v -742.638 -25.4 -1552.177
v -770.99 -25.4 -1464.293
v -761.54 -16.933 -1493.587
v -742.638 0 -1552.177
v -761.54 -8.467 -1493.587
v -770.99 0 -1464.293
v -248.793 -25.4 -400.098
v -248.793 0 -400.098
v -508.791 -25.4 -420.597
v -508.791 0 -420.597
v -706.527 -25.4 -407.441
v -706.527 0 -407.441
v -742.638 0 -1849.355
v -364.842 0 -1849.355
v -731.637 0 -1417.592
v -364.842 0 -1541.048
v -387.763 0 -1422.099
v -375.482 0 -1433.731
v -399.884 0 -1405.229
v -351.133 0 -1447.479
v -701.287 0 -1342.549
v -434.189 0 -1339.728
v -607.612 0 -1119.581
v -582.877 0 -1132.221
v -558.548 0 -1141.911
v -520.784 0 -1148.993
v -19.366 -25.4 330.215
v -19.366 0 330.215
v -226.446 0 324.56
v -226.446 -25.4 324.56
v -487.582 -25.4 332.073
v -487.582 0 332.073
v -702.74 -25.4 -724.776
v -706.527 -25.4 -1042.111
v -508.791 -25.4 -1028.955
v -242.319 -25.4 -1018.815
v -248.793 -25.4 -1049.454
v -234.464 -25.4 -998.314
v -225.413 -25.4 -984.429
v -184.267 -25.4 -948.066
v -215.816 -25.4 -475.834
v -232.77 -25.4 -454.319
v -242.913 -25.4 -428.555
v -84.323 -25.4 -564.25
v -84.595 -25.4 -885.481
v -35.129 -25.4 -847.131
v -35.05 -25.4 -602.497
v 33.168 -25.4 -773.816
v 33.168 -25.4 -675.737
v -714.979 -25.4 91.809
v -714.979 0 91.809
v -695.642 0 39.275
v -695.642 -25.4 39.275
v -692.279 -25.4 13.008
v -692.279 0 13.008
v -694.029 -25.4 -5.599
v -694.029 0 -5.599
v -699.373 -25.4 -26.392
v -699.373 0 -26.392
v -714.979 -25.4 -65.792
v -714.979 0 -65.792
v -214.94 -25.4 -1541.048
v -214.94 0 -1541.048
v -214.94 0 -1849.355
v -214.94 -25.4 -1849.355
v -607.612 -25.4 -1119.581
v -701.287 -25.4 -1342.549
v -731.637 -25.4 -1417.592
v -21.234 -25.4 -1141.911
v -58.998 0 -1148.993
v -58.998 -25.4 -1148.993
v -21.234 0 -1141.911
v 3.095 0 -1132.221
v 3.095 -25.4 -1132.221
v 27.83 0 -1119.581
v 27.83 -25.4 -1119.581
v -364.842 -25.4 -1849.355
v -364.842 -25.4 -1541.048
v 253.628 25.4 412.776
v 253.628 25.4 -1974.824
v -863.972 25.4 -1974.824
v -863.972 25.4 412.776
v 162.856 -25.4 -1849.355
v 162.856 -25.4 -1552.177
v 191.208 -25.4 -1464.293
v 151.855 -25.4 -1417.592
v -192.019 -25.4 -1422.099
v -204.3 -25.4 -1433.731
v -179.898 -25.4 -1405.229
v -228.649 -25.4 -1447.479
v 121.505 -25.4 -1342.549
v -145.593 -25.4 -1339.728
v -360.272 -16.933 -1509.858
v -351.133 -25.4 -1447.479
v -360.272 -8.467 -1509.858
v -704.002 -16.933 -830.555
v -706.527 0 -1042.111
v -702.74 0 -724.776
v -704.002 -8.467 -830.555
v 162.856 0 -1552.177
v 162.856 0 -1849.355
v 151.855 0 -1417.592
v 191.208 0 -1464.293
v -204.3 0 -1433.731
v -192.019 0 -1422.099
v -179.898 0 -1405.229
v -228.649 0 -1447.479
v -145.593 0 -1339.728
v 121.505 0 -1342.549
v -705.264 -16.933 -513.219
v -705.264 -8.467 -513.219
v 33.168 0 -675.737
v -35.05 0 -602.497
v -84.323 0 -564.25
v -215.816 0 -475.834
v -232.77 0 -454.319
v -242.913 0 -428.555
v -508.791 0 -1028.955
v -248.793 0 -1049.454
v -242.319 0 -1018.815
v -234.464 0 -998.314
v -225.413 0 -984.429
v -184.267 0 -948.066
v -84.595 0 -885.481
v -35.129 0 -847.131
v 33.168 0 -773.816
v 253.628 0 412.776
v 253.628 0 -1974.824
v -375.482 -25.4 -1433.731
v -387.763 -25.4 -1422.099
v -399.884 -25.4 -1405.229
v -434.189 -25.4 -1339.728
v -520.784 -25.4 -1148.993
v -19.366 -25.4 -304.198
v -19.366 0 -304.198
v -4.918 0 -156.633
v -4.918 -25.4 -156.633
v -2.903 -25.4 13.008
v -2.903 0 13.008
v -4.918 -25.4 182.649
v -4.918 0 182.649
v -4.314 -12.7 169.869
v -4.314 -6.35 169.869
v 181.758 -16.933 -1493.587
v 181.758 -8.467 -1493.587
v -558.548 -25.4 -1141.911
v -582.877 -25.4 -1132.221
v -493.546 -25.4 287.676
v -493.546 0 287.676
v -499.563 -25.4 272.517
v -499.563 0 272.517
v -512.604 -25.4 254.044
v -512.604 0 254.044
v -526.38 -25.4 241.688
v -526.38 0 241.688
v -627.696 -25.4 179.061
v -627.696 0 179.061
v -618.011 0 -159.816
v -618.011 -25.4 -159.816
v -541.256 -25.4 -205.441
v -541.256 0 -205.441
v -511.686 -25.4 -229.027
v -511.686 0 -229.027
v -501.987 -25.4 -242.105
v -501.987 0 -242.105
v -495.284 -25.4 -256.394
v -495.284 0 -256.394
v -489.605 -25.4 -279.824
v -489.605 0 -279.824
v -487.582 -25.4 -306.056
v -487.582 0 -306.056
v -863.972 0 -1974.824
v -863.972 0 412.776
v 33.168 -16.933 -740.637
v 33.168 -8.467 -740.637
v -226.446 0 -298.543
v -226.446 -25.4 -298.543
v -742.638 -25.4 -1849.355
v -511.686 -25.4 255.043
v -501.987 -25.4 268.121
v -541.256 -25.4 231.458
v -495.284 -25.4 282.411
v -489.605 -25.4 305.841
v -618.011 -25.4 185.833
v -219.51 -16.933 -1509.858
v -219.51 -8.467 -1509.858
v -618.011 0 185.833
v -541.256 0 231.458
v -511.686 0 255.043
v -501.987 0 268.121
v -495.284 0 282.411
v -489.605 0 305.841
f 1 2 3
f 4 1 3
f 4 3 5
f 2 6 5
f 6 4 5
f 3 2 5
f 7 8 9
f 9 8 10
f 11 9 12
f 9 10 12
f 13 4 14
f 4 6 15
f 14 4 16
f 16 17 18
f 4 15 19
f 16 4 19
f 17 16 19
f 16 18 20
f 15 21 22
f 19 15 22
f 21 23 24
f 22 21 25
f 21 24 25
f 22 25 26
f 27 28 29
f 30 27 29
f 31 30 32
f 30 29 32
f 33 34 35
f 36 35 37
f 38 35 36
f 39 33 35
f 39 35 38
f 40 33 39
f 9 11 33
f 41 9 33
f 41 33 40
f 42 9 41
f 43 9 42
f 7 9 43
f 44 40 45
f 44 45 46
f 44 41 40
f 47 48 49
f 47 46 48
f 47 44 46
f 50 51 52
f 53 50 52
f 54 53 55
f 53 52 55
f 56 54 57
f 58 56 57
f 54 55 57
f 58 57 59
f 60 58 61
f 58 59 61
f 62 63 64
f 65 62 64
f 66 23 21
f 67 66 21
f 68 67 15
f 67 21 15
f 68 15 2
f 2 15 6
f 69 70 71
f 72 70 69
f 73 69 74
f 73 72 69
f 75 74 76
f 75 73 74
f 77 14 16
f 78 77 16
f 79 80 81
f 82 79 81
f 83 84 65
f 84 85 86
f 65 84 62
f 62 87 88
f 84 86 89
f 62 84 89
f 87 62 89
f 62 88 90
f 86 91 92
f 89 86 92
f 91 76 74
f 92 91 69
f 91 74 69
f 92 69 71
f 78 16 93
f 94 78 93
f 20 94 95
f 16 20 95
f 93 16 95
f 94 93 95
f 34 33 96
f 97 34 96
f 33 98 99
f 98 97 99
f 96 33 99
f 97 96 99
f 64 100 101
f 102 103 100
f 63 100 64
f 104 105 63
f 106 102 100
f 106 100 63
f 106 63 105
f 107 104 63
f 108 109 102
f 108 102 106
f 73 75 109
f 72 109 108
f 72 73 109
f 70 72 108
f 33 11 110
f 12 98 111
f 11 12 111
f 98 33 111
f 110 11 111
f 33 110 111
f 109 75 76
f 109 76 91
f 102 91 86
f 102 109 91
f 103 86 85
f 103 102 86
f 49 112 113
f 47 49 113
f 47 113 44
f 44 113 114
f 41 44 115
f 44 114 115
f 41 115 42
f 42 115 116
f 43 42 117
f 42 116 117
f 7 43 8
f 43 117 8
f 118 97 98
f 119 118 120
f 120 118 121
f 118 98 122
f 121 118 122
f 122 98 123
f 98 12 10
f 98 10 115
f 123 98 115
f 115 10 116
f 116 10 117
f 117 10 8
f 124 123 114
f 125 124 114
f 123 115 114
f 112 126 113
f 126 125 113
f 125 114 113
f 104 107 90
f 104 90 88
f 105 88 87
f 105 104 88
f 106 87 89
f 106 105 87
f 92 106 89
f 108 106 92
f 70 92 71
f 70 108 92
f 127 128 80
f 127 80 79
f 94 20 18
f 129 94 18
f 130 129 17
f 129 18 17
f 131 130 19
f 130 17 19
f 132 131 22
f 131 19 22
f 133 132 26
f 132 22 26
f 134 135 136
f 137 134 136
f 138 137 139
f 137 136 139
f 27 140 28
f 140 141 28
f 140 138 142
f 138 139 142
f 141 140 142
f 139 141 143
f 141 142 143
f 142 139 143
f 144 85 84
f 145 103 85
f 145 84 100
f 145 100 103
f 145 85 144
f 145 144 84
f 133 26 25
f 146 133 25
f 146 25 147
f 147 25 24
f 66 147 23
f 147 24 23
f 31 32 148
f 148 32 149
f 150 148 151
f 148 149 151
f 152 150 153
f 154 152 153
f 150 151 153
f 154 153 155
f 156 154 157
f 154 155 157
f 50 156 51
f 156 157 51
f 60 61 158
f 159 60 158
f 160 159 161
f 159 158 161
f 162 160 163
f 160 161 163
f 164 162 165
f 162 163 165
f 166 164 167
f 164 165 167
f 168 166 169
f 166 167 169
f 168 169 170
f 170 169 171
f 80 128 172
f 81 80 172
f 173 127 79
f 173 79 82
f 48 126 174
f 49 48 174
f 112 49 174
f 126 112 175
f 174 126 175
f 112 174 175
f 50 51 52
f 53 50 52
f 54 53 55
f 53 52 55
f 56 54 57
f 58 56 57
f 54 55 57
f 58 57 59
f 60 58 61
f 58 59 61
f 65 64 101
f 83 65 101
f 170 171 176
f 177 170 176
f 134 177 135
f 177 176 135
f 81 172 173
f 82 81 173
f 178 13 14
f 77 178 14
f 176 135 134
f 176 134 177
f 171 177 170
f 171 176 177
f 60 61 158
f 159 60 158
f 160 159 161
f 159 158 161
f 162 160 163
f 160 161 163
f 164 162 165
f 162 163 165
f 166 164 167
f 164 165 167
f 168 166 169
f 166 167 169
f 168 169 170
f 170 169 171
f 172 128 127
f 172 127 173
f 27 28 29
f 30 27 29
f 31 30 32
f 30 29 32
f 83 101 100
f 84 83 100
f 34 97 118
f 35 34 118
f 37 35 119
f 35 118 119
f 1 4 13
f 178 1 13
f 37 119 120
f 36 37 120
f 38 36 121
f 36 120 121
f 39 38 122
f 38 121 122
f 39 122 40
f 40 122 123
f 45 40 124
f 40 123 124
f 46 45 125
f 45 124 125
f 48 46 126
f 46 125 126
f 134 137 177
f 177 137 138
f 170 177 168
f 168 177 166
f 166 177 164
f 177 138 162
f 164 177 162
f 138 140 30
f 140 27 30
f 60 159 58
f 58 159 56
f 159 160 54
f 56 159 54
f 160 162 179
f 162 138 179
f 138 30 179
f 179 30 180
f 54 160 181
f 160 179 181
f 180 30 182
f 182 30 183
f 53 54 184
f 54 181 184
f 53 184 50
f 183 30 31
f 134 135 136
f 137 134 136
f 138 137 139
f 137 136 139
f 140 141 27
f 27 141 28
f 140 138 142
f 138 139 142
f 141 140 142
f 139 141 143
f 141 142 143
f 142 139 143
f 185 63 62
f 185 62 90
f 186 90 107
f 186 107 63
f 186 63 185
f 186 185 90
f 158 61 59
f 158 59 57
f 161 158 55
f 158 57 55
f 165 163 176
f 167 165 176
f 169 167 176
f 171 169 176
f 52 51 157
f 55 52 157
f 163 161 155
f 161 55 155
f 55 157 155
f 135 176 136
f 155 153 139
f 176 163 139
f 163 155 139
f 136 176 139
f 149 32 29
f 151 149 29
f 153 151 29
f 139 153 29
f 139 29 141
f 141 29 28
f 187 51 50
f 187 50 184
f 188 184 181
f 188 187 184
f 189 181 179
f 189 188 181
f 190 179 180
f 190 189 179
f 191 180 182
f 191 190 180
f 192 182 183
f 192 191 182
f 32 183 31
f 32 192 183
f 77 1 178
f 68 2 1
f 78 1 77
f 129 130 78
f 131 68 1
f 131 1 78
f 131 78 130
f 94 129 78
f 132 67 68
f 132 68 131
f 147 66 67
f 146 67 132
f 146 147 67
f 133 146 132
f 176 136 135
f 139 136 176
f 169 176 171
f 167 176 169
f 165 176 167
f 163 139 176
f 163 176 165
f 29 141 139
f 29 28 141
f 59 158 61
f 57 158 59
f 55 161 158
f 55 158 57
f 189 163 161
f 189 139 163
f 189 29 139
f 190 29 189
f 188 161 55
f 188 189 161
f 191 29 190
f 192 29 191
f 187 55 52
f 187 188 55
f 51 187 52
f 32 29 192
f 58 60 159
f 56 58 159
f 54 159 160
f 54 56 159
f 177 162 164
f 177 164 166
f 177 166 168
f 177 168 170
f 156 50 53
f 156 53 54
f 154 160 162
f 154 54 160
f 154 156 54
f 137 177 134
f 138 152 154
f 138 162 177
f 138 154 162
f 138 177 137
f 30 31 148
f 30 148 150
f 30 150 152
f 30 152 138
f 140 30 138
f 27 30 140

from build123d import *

# Parameters (mm, degrees)
F2_DEPTH = 25.4
F3_W     = 1117.6
F3_H     = 2387.6
F4_DEPTH = 25.4


# Not quite as in the source:
# - the dataset's text gives a spline's control points without its knots; the knots are read off the source's solid


with BuildPart() as f2:
    # F0 (on Front) → F2 (new body)
    with BuildSketch(Plane.XZ):
        with BuildLine():
            add(Edge.make_bspline(
                [(-19.3661805242, -304.1977286339), (-80.8509153389, -301.3951576074), (-215.7568387903, -295.2459331942), (-391.7817809144, -302.2462373132), (-487.5815808773, -306.0560822487)],
                knots=[0, 0, 0, 0, 0.4557600826, 1, 1, 1, 1], degree=3))
            add(Edge.make_bspline(
                [(-19.3661805242, -304.1977286339), (-12.0053351624, -250.6496178417), (-1.2323408104, -144.2686003565), (-2.9034086037, -39.0068169321), (-2.9034086037, 13.0084119737)],
                knots=[0, 0, 0, 0, 0.5032901479, 1, 1, 1, 1], degree=3))
            add(Edge.make_bspline(
                [(-19.3661805242, 330.2145525813), (-12.0053351624, 276.6664417891), (-1.2323408104, 170.2854243039), (-2.9034086037, 65.0236408795), (-2.9034086037, 13.0084119737)],
                knots=[0, 0, 0, 0, 0.5032901479, 1, 1, 1, 1], degree=3))
            add(Edge.make_bspline(
                [(-19.3661805242, 330.2145525813), (-80.8509153389, 327.4119815549), (-215.7568387903, 321.2627571417), (-391.7817809144, 328.2630612606), (-487.5815808773, 332.0729061961)],
                knots=[0, 0, 0, 0, 0.4557600826, 1, 1, 1, 1], degree=3))
            add(Edge.make_bspline(
                [(-714.9790525436, 91.8091461062), (-688.1054453065, 123.0561909313), (-635.963798658, 184.8539191183), (-525.8677553528, 234.0123661327), (-492.4773215799, 277.6462444761), (-488.000998717, 312.6780187869), (-487.5815808773, 332.0729061961)],
                knots=[0, 0, 0, 0, 0.3067591927, 0.6039732165, 0.7995556084, 1, 1, 1, 1], degree=3))
            add(Edge.make_bspline(
                [(-714.9790525436, 91.8091461062), (-703.6292552948, 65.5422347287), (-680.9296607971, 13.0084119737), (-703.6292552948, -39.5254107813), (-714.9790525436, -65.7923221588)],
                knots=[0, 0, 0, 0, 0.5, 1, 1, 1, 1], degree=3))
            add(Edge.make_bspline(
                [(-714.9790525436, -65.7923221588), (-688.1054453065, -97.0393669839), (-635.963798658, -158.8370951708), (-525.8677553528, -207.9955421852), (-492.4773215799, -251.6294205287), (-488.000998717, -286.6611948395), (-487.5815808773, -306.0560822487)],
                knots=[0, 0, 0, 0, 0.3067591927, 0.6039732165, 0.7995556084, 1, 1, 1, 1], degree=3))
        make_face()
    extrude(amount=F2_DEPTH)


with BuildPart() as f2b:
    # F1 (on Front) → F2, piece 2 (new body)
    with BuildSketch(Plane.XZ):
        with BuildLine():
            add(Edge.make_bspline(
                [(-228.6487041344, -1447.4794787136), (-218.9537680176, -1442.8331811079), (-196.0160951189, -1431.8403026208), (-159.0436729676, -1374.2670672458), (-99.2062321703, -1239.5307850908), (-58.9978663553, -1148.9933949677)],
                knots=[0, 0, 0, 0, 0.1936500421, 0.4581650944, 1, 1, 1, 1], degree=3))
            add(Edge.make_bspline(
                [(-214.9400903215, -1541.0479658065), (-219.5096282591, -1509.8584701089), (-224.0791661967, -1478.6689744113), (-228.6487041344, -1447.4794787136)],
                knots=[0, 0, 0, 0, 1, 1, 1, 1], degree=3))
            Line((-214.9400903215, -1541.0479658065), (-214.9400903215, -1849.3550693843))
            Line((-214.9400903215, -1849.3550693843), (162.8563435446, -1849.3550693843))
            Line((162.8563435446, -1849.3550693843), (162.8563435446, -1552.1766614882))
            add(Edge.make_bspline(
                [(191.2083061109, -1464.2927941648), (181.7576519221, -1493.5874166059), (172.3069977334, -1522.8820390471), (162.8563435446, -1552.1766614882)],
                knots=[0, 0, 0, 0, 1, 1, 1, 1], degree=3))
            add(Edge.make_bspline(
                [(27.8300525318, -1119.5806485382), (58.7260295475, -1191.1417299957), (106.9032959188, -1302.7296328945), (129.4230449419, -1363.6756023524), (150.6947810894, -1424.5121938967), (177.8604290666, -1451.1863917758), (191.2083061109, -1464.2927941648)],
                knots=[0, 0, 0, 0, 0.3803399346, 0.5930784559, 0.8000585614, 1, 1, 1, 1], degree=3))
            add(Edge.make_bspline(
                [(-58.9978663553, -1148.9933949677), (-45.7725702422, -1147.2922309278), (-17.6835949522, -1143.679158353), (12.0801469027, -1127.9198891038), (27.8300525318, -1119.5806485382)],
                knots=[0, 0, 0, 0, 0.4708358342, 1, 1, 1, 1], degree=3))
        make_face()
    extrude(amount=F2_DEPTH)


with BuildPart() as f2c:
    # F1 (on Front) → F2, piece 3 (new body)
    with BuildSketch(Plane.XZ):
        with BuildLine():
            Line((-364.8419774692, -1849.3550693843), (-364.8419774692, -1541.0479658065))
            add(Edge.make_bspline(
                [(-364.8419774692, -1541.0479658065), (-360.2724395316, -1509.8584701089), (-355.7029015939, -1478.6689744113), (-351.1333636563, -1447.4794787136)],
                knots=[0, 0, 0, 0, 1, 1, 1, 1], degree=3))
            add(Edge.make_bspline(
                [(-351.1333636563, -1447.4794787136), (-360.8282997731, -1442.8331811079), (-383.7659726718, -1431.8403026208), (-420.7383948231, -1374.2670672458), (-480.5758356204, -1239.5307850908), (-520.7842014354, -1148.9933949677)],
                knots=[0, 0, 0, 0, 0.1936500421, 0.4581650944, 1, 1, 1, 1], degree=3))
            add(Edge.make_bspline(
                [(-520.7842014354, -1148.9933949677), (-534.0094975485, -1147.2922309278), (-562.0984728385, -1143.679158353), (-591.8622146934, -1127.9198891038), (-607.6121203225, -1119.5806485382)],
                knots=[0, 0, 0, 0, 0.4708358342, 1, 1, 1, 1], degree=3))
            add(Edge.make_bspline(
                [(-607.6121203225, -1119.5806485382), (-638.5080973382, -1191.1417299957), (-686.6853637095, -1302.7296328945), (-709.2051127326, -1363.6756023524), (-730.4768488801, -1424.5121938967), (-757.6424968573, -1451.1863917758), (-770.9903739016, -1464.2927941648)],
                knots=[0, 0, 0, 0, 0.3803399346, 0.5930784559, 0.8000585614, 1, 1, 1, 1], degree=3))
            add(Edge.make_bspline(
                [(-770.9903739016, -1464.2927941648), (-761.5397197128, -1493.5874166059), (-752.089065524, -1522.8820390471), (-742.6384113353, -1552.1766614882)],
                knots=[0, 0, 0, 0, 1, 1, 1, 1], degree=3))
            Line((-742.6384113353, -1552.1766614882), (-742.6384113353, -1849.3550693843))
            Line((-742.6384113353, -1849.3550693843), (-364.8419774692, -1849.3550693843))
        make_face()
    extrude(amount=F2_DEPTH)


with BuildPart() as f2d:
    # F1 (on Front) → F2, piece 4 (new body)
    with BuildSketch(Plane.XZ):
        with BuildLine():
            add(Edge.make_bspline(
                [(-19.3661805242, 330.2145525813), (-80.8509153389, 327.4119815549), (-215.7568387903, 321.2627571417), (-391.7817809144, 328.2630612606), (-487.5815808773, 332.0729061961)],
                knots=[0, 0, 0, 0, 0.4557600826, 1, 1, 1, 1], degree=3))
            add(Edge.make_bspline(
                [(-487.5815808773, 332.0729061961), (-488.000998717, 312.6780187869), (-492.4773215799, 277.6462444761), (-525.8677553528, 234.0123661327), (-635.963798658, 184.8539191183), (-688.1054453065, 123.0561909313), (-714.9790525436, 91.8091461062)],
                knots=[0, 0, 0, 0, 0.2004443916, 0.3960267835, 0.6932408073, 1, 1, 1, 1], degree=3))
            add(Edge.make_bspline(
                [(-714.9790525436, 91.8091461062), (-703.6292552948, 65.5422347287), (-680.9296607971, 13.0084119737), (-703.6292552948, -39.5254107813), (-714.9790525436, -65.7923221588)],
                knots=[0, 0, 0, 0, 0.5, 1, 1, 1, 1], degree=3))
            add(Edge.make_bspline(
                [(-714.9790525436, -65.7923221588), (-688.1054453065, -97.0393669839), (-635.963798658, -158.8370951708), (-525.8677553528, -207.9955421852), (-492.4773215799, -251.6294205287), (-488.000998717, -286.6611948395), (-487.5815808773, -306.0560822487)],
                knots=[0, 0, 0, 0, 0.3067591927, 0.6039732165, 0.7995556084, 1, 1, 1, 1], degree=3))
            add(Edge.make_bspline(
                [(-487.5815808773, -306.0560822487), (-391.7817809144, -302.2462373132), (-215.7568387903, -295.2459331942), (-80.8509153389, -301.3951576074), (-19.3661805242, -304.1977286339)],
                knots=[0, 0, 0, 0, 0.5442399174, 1, 1, 1, 1], degree=3))
            add(Edge.make_bspline(
                [(-19.3661805242, -304.1977286339), (-12.0053351624, -250.6496178417), (-1.2323408104, -144.2686003565), (-2.9034086037, -39.0068169321), (-2.9034086037, 13.0084119737)],
                knots=[0, 0, 0, 0, 0.5032901479, 1, 1, 1, 1], degree=3))
            add(Edge.make_bspline(
                [(-2.9034086037, 13.0084119737), (-2.9034086037, 65.0236408795), (-1.2323408104, 170.2854243039), (-12.0053351624, 276.6664417891), (-19.3661805242, 330.2145525813)],
                knots=[0, 0, 0, 0, 0.4967098521, 1, 1, 1, 1], degree=3))
        make_face()
    extrude(amount=F2_DEPTH)


with BuildPart() as f2e:
    # F1 (on Front) → F2, piece 5 (new body)
    with BuildSketch(Plane.XZ):
        with BuildLine():
            add(Edge.make_bspline(
                [(33.1680851389, -773.8157648911), (33.1680851389, -738.939027458), (33.1680851389, -710.6132623747), (33.1680851389, -675.7365249416)],
                knots=[0, 0, 0, 0, 1, 1, 1, 1], degree=3))
            add(Edge.make_bspline(
                [(33.1680851389, -675.7365249416), (20.6098061512, -662.8767934516), (-4.3813482561, -634.8395333098), (-51.3009460882, -582.2261877467), (-139.4460358283, -530.7951922079), (-200.8186488979, -492.0300492954), (-239.2845563093, -453.2698961725), (-245.6035321453, -417.9393915327), (-248.7929982733, -400.0977984016)],
                knots=[0, 0, 0, 0, 0.1506791965, 0.322350645, 0.5298093251, 0.7055655926, 0.8516945833, 1, 1, 1, 1], degree=3))
            add(Edge.make_bspline(
                [(-248.7929982733, -400.0977984016), (-322.8442956619, -407.4236513718), (-456.7914302975, -420.6749656462), (-597.7353998354, -422.6870039331), (-671.8963425102, -412.2940111542), (-706.5266592097, -407.4408820217)],
                knots=[0, 0, 0, 0, 0.3972322443, 0.7185305698, 1, 1, 1, 1], degree=3))
            add(Edge.make_bspline(
                [(-706.5266592097, -407.4408820217), (-705.2643719108, -513.2193029866), (-704.002084612, -618.9977239515), (-702.7397973131, -724.7761449163)],
                knots=[0, 0, 0, 0, 1, 1, 1, 1], degree=3))
            add(Edge.make_bspline(
                [(-702.7397973131, -724.7761449163), (-704.002084612, -830.5545658812), (-705.2643719108, -936.3329868461), (-706.5266592097, -1042.111407811)],
                knots=[0, 0, 0, 0, 1, 1, 1, 1], degree=3))
            add(Edge.make_bspline(
                [(-706.5266592097, -1042.111407811), (-671.8963425102, -1037.2582786785), (-597.7353998354, -1026.8652858996), (-456.7914302975, -1028.8773241865), (-322.8442956619, -1042.1286384609), (-248.7929982733, -1049.4544914311)],
                knots=[0, 0, 0, 0, 0.2814694302, 0.6027677557, 1, 1, 1, 1], degree=3))
            add(Edge.make_bspline(
                [(-248.7929982733, -1049.4544914311), (-245.6035321453, -1031.6128982999), (-239.2845563093, -996.2823936602), (-200.8186488979, -957.5222405373), (-139.4460358283, -918.7570976248), (-51.3009460882, -867.326102086), (-4.3813482561, -814.7127565229), (20.6098061512, -786.6754963811), (33.1680851389, -773.8157648911)],
                knots=[0, 0, 0, 0, 0.1483054167, 0.2944344074, 0.4701906749, 0.677649355, 0.8493208035, 1, 1, 1, 1], degree=3))
        make_face()
    extrude(amount=F2_DEPTH)


with BuildPart() as f4:
    # F3 (on face) → F4 (new body)
    with BuildSketch(Plane(origin=(0, 0, 0), x_dir=(-1, 0, 0), z_dir=(0, 1, 0))):
        with Locations((305.172461319, -781.0237682343)):
            Rectangle(F3_W, F3_H)
        with BuildLine():
            add(Edge.make_bspline(
                [(19.3661805242, -304.1977286339), (12.0053351624, -250.6496178417), (1.2323408104, -144.2686003565), (2.9034086037, -39.0068169321), (2.9034086037, 13.0084119737)],
                knots=[0, 0, 0, 0, 0.5032901479, 1, 1, 1, 1], degree=3))
            add(Edge.make_bspline(
                [(2.9034086037, 13.0084119737), (2.9034086037, 65.0236408795), (1.2323408104, 170.2854243039), (12.0053351624, 276.6664417891), (19.3661805242, 330.2145525813)],
                knots=[0, 0, 0, 0, 0.4967098521, 1, 1, 1, 1], degree=3))
            add(Edge.make_bspline(
                [(19.3661805242, 330.2145525813), (80.8509153389, 327.4119815549), (215.7568387903, 321.2627571417), (391.7817809144, 328.2630612606), (487.5815808773, 332.0729061961)],
                knots=[0, 0, 0, 0, 0.4557600826, 1, 1, 1, 1], degree=3))
            add(Edge.make_bspline(
                [(487.5815808773, 332.0729061961), (488.000998717, 312.6780187869), (492.4773215799, 277.6462444761), (525.8677553528, 234.0123661327), (635.963798658, 184.8539191183), (688.1054453065, 123.0561909313), (714.9790525436, 91.8091461062)],
                knots=[0, 0, 0, 0, 0.2004443916, 0.3960267835, 0.6932408073, 1, 1, 1, 1], degree=3))
            add(Edge.make_bspline(
                [(714.9790525436, 91.8091461062), (703.6292552948, 65.5422347287), (680.9296607971, 13.0084119737), (703.6292552948, -39.5254107813), (714.9790525436, -65.7923221588)],
                knots=[0, 0, 0, 0, 0.5, 1, 1, 1, 1], degree=3))
            add(Edge.make_bspline(
                [(714.9790525436, -65.7923221588), (688.1054453065, -97.0393669839), (635.963798658, -158.8370951708), (525.8677553528, -207.9955421852), (492.4773215799, -251.6294205287), (488.000998717, -286.6611948395), (487.5815808773, -306.0560822487)],
                knots=[0, 0, 0, 0, 0.3067591927, 0.6039732165, 0.7995556084, 1, 1, 1, 1], degree=3))
            add(Edge.make_bspline(
                [(487.5815808773, -306.0560822487), (391.7817809144, -302.2462373132), (215.7568387903, -295.2459331942), (80.8509153389, -301.3951576074), (19.3661805242, -304.1977286339)],
                knots=[0, 0, 0, 0, 0.5442399174, 1, 1, 1, 1], degree=3))
        make_face(mode=Mode.SUBTRACT)
        with BuildLine():
            add(Edge.make_bspline(
                [(2.9034086037, 13.0084119737), (2.9034086037, 65.0236408795), (1.2323408104, 170.2854243039), (12.0053351624, 276.6664417891), (19.3661805242, 330.2145525813)],
                knots=[0, 0, 0, 0, 0.4967098521, 1, 1, 1, 1], degree=3))
            add(Edge.make_bspline(
                [(19.3661805242, -304.1977286339), (12.0053351624, -250.6496178417), (1.2323408104, -144.2686003565), (2.9034086037, -39.0068169321), (2.9034086037, 13.0084119737)],
                knots=[0, 0, 0, 0, 0.5032901479, 1, 1, 1, 1], degree=3))
            add(Edge.make_bspline(
                [(487.5815808773, -306.0560822487), (391.7817809144, -302.2462373132), (215.7568387903, -295.2459331942), (80.8509153389, -301.3951576074), (19.3661805242, -304.1977286339)],
                knots=[0, 0, 0, 0, 0.5442399174, 1, 1, 1, 1], degree=3))
            add(Edge.make_bspline(
                [(714.9790525436, -65.7923221588), (688.1054453065, -97.0393669839), (635.963798658, -158.8370951708), (525.8677553528, -207.9955421852), (492.4773215799, -251.6294205287), (488.000998717, -286.6611948395), (487.5815808773, -306.0560822487)],
                knots=[0, 0, 0, 0, 0.3067591927, 0.6039732165, 0.7995556084, 1, 1, 1, 1], degree=3))
            add(Edge.make_bspline(
                [(714.9790525436, 91.8091461062), (703.6292552948, 65.5422347287), (680.9296607971, 13.0084119737), (703.6292552948, -39.5254107813), (714.9790525436, -65.7923221588)],
                knots=[0, 0, 0, 0, 0.5, 1, 1, 1, 1], degree=3))
            add(Edge.make_bspline(
                [(487.5815808773, 332.0729061961), (488.000998717, 312.6780187869), (492.4773215799, 277.6462444761), (525.8677553528, 234.0123661327), (635.963798658, 184.8539191183), (688.1054453065, 123.0561909313), (714.9790525436, 91.8091461062)],
                knots=[0, 0, 0, 0, 0.2004443916, 0.3960267835, 0.6932408073, 1, 1, 1, 1], degree=3))
            add(Edge.make_bspline(
                [(19.3661805242, 330.2145525813), (80.8509153389, 327.4119815549), (215.7568387903, 321.2627571417), (391.7817809144, 328.2630612606), (487.5815808773, 332.0729061961)],
                knots=[0, 0, 0, 0, 0.4557600826, 1, 1, 1, 1], degree=3))
        make_face()
    extrude(amount=F4_DEPTH)


solid = Compound([f2.part, f2b.part, f2c.part, f2d.part, f2e.part, f4.part])
